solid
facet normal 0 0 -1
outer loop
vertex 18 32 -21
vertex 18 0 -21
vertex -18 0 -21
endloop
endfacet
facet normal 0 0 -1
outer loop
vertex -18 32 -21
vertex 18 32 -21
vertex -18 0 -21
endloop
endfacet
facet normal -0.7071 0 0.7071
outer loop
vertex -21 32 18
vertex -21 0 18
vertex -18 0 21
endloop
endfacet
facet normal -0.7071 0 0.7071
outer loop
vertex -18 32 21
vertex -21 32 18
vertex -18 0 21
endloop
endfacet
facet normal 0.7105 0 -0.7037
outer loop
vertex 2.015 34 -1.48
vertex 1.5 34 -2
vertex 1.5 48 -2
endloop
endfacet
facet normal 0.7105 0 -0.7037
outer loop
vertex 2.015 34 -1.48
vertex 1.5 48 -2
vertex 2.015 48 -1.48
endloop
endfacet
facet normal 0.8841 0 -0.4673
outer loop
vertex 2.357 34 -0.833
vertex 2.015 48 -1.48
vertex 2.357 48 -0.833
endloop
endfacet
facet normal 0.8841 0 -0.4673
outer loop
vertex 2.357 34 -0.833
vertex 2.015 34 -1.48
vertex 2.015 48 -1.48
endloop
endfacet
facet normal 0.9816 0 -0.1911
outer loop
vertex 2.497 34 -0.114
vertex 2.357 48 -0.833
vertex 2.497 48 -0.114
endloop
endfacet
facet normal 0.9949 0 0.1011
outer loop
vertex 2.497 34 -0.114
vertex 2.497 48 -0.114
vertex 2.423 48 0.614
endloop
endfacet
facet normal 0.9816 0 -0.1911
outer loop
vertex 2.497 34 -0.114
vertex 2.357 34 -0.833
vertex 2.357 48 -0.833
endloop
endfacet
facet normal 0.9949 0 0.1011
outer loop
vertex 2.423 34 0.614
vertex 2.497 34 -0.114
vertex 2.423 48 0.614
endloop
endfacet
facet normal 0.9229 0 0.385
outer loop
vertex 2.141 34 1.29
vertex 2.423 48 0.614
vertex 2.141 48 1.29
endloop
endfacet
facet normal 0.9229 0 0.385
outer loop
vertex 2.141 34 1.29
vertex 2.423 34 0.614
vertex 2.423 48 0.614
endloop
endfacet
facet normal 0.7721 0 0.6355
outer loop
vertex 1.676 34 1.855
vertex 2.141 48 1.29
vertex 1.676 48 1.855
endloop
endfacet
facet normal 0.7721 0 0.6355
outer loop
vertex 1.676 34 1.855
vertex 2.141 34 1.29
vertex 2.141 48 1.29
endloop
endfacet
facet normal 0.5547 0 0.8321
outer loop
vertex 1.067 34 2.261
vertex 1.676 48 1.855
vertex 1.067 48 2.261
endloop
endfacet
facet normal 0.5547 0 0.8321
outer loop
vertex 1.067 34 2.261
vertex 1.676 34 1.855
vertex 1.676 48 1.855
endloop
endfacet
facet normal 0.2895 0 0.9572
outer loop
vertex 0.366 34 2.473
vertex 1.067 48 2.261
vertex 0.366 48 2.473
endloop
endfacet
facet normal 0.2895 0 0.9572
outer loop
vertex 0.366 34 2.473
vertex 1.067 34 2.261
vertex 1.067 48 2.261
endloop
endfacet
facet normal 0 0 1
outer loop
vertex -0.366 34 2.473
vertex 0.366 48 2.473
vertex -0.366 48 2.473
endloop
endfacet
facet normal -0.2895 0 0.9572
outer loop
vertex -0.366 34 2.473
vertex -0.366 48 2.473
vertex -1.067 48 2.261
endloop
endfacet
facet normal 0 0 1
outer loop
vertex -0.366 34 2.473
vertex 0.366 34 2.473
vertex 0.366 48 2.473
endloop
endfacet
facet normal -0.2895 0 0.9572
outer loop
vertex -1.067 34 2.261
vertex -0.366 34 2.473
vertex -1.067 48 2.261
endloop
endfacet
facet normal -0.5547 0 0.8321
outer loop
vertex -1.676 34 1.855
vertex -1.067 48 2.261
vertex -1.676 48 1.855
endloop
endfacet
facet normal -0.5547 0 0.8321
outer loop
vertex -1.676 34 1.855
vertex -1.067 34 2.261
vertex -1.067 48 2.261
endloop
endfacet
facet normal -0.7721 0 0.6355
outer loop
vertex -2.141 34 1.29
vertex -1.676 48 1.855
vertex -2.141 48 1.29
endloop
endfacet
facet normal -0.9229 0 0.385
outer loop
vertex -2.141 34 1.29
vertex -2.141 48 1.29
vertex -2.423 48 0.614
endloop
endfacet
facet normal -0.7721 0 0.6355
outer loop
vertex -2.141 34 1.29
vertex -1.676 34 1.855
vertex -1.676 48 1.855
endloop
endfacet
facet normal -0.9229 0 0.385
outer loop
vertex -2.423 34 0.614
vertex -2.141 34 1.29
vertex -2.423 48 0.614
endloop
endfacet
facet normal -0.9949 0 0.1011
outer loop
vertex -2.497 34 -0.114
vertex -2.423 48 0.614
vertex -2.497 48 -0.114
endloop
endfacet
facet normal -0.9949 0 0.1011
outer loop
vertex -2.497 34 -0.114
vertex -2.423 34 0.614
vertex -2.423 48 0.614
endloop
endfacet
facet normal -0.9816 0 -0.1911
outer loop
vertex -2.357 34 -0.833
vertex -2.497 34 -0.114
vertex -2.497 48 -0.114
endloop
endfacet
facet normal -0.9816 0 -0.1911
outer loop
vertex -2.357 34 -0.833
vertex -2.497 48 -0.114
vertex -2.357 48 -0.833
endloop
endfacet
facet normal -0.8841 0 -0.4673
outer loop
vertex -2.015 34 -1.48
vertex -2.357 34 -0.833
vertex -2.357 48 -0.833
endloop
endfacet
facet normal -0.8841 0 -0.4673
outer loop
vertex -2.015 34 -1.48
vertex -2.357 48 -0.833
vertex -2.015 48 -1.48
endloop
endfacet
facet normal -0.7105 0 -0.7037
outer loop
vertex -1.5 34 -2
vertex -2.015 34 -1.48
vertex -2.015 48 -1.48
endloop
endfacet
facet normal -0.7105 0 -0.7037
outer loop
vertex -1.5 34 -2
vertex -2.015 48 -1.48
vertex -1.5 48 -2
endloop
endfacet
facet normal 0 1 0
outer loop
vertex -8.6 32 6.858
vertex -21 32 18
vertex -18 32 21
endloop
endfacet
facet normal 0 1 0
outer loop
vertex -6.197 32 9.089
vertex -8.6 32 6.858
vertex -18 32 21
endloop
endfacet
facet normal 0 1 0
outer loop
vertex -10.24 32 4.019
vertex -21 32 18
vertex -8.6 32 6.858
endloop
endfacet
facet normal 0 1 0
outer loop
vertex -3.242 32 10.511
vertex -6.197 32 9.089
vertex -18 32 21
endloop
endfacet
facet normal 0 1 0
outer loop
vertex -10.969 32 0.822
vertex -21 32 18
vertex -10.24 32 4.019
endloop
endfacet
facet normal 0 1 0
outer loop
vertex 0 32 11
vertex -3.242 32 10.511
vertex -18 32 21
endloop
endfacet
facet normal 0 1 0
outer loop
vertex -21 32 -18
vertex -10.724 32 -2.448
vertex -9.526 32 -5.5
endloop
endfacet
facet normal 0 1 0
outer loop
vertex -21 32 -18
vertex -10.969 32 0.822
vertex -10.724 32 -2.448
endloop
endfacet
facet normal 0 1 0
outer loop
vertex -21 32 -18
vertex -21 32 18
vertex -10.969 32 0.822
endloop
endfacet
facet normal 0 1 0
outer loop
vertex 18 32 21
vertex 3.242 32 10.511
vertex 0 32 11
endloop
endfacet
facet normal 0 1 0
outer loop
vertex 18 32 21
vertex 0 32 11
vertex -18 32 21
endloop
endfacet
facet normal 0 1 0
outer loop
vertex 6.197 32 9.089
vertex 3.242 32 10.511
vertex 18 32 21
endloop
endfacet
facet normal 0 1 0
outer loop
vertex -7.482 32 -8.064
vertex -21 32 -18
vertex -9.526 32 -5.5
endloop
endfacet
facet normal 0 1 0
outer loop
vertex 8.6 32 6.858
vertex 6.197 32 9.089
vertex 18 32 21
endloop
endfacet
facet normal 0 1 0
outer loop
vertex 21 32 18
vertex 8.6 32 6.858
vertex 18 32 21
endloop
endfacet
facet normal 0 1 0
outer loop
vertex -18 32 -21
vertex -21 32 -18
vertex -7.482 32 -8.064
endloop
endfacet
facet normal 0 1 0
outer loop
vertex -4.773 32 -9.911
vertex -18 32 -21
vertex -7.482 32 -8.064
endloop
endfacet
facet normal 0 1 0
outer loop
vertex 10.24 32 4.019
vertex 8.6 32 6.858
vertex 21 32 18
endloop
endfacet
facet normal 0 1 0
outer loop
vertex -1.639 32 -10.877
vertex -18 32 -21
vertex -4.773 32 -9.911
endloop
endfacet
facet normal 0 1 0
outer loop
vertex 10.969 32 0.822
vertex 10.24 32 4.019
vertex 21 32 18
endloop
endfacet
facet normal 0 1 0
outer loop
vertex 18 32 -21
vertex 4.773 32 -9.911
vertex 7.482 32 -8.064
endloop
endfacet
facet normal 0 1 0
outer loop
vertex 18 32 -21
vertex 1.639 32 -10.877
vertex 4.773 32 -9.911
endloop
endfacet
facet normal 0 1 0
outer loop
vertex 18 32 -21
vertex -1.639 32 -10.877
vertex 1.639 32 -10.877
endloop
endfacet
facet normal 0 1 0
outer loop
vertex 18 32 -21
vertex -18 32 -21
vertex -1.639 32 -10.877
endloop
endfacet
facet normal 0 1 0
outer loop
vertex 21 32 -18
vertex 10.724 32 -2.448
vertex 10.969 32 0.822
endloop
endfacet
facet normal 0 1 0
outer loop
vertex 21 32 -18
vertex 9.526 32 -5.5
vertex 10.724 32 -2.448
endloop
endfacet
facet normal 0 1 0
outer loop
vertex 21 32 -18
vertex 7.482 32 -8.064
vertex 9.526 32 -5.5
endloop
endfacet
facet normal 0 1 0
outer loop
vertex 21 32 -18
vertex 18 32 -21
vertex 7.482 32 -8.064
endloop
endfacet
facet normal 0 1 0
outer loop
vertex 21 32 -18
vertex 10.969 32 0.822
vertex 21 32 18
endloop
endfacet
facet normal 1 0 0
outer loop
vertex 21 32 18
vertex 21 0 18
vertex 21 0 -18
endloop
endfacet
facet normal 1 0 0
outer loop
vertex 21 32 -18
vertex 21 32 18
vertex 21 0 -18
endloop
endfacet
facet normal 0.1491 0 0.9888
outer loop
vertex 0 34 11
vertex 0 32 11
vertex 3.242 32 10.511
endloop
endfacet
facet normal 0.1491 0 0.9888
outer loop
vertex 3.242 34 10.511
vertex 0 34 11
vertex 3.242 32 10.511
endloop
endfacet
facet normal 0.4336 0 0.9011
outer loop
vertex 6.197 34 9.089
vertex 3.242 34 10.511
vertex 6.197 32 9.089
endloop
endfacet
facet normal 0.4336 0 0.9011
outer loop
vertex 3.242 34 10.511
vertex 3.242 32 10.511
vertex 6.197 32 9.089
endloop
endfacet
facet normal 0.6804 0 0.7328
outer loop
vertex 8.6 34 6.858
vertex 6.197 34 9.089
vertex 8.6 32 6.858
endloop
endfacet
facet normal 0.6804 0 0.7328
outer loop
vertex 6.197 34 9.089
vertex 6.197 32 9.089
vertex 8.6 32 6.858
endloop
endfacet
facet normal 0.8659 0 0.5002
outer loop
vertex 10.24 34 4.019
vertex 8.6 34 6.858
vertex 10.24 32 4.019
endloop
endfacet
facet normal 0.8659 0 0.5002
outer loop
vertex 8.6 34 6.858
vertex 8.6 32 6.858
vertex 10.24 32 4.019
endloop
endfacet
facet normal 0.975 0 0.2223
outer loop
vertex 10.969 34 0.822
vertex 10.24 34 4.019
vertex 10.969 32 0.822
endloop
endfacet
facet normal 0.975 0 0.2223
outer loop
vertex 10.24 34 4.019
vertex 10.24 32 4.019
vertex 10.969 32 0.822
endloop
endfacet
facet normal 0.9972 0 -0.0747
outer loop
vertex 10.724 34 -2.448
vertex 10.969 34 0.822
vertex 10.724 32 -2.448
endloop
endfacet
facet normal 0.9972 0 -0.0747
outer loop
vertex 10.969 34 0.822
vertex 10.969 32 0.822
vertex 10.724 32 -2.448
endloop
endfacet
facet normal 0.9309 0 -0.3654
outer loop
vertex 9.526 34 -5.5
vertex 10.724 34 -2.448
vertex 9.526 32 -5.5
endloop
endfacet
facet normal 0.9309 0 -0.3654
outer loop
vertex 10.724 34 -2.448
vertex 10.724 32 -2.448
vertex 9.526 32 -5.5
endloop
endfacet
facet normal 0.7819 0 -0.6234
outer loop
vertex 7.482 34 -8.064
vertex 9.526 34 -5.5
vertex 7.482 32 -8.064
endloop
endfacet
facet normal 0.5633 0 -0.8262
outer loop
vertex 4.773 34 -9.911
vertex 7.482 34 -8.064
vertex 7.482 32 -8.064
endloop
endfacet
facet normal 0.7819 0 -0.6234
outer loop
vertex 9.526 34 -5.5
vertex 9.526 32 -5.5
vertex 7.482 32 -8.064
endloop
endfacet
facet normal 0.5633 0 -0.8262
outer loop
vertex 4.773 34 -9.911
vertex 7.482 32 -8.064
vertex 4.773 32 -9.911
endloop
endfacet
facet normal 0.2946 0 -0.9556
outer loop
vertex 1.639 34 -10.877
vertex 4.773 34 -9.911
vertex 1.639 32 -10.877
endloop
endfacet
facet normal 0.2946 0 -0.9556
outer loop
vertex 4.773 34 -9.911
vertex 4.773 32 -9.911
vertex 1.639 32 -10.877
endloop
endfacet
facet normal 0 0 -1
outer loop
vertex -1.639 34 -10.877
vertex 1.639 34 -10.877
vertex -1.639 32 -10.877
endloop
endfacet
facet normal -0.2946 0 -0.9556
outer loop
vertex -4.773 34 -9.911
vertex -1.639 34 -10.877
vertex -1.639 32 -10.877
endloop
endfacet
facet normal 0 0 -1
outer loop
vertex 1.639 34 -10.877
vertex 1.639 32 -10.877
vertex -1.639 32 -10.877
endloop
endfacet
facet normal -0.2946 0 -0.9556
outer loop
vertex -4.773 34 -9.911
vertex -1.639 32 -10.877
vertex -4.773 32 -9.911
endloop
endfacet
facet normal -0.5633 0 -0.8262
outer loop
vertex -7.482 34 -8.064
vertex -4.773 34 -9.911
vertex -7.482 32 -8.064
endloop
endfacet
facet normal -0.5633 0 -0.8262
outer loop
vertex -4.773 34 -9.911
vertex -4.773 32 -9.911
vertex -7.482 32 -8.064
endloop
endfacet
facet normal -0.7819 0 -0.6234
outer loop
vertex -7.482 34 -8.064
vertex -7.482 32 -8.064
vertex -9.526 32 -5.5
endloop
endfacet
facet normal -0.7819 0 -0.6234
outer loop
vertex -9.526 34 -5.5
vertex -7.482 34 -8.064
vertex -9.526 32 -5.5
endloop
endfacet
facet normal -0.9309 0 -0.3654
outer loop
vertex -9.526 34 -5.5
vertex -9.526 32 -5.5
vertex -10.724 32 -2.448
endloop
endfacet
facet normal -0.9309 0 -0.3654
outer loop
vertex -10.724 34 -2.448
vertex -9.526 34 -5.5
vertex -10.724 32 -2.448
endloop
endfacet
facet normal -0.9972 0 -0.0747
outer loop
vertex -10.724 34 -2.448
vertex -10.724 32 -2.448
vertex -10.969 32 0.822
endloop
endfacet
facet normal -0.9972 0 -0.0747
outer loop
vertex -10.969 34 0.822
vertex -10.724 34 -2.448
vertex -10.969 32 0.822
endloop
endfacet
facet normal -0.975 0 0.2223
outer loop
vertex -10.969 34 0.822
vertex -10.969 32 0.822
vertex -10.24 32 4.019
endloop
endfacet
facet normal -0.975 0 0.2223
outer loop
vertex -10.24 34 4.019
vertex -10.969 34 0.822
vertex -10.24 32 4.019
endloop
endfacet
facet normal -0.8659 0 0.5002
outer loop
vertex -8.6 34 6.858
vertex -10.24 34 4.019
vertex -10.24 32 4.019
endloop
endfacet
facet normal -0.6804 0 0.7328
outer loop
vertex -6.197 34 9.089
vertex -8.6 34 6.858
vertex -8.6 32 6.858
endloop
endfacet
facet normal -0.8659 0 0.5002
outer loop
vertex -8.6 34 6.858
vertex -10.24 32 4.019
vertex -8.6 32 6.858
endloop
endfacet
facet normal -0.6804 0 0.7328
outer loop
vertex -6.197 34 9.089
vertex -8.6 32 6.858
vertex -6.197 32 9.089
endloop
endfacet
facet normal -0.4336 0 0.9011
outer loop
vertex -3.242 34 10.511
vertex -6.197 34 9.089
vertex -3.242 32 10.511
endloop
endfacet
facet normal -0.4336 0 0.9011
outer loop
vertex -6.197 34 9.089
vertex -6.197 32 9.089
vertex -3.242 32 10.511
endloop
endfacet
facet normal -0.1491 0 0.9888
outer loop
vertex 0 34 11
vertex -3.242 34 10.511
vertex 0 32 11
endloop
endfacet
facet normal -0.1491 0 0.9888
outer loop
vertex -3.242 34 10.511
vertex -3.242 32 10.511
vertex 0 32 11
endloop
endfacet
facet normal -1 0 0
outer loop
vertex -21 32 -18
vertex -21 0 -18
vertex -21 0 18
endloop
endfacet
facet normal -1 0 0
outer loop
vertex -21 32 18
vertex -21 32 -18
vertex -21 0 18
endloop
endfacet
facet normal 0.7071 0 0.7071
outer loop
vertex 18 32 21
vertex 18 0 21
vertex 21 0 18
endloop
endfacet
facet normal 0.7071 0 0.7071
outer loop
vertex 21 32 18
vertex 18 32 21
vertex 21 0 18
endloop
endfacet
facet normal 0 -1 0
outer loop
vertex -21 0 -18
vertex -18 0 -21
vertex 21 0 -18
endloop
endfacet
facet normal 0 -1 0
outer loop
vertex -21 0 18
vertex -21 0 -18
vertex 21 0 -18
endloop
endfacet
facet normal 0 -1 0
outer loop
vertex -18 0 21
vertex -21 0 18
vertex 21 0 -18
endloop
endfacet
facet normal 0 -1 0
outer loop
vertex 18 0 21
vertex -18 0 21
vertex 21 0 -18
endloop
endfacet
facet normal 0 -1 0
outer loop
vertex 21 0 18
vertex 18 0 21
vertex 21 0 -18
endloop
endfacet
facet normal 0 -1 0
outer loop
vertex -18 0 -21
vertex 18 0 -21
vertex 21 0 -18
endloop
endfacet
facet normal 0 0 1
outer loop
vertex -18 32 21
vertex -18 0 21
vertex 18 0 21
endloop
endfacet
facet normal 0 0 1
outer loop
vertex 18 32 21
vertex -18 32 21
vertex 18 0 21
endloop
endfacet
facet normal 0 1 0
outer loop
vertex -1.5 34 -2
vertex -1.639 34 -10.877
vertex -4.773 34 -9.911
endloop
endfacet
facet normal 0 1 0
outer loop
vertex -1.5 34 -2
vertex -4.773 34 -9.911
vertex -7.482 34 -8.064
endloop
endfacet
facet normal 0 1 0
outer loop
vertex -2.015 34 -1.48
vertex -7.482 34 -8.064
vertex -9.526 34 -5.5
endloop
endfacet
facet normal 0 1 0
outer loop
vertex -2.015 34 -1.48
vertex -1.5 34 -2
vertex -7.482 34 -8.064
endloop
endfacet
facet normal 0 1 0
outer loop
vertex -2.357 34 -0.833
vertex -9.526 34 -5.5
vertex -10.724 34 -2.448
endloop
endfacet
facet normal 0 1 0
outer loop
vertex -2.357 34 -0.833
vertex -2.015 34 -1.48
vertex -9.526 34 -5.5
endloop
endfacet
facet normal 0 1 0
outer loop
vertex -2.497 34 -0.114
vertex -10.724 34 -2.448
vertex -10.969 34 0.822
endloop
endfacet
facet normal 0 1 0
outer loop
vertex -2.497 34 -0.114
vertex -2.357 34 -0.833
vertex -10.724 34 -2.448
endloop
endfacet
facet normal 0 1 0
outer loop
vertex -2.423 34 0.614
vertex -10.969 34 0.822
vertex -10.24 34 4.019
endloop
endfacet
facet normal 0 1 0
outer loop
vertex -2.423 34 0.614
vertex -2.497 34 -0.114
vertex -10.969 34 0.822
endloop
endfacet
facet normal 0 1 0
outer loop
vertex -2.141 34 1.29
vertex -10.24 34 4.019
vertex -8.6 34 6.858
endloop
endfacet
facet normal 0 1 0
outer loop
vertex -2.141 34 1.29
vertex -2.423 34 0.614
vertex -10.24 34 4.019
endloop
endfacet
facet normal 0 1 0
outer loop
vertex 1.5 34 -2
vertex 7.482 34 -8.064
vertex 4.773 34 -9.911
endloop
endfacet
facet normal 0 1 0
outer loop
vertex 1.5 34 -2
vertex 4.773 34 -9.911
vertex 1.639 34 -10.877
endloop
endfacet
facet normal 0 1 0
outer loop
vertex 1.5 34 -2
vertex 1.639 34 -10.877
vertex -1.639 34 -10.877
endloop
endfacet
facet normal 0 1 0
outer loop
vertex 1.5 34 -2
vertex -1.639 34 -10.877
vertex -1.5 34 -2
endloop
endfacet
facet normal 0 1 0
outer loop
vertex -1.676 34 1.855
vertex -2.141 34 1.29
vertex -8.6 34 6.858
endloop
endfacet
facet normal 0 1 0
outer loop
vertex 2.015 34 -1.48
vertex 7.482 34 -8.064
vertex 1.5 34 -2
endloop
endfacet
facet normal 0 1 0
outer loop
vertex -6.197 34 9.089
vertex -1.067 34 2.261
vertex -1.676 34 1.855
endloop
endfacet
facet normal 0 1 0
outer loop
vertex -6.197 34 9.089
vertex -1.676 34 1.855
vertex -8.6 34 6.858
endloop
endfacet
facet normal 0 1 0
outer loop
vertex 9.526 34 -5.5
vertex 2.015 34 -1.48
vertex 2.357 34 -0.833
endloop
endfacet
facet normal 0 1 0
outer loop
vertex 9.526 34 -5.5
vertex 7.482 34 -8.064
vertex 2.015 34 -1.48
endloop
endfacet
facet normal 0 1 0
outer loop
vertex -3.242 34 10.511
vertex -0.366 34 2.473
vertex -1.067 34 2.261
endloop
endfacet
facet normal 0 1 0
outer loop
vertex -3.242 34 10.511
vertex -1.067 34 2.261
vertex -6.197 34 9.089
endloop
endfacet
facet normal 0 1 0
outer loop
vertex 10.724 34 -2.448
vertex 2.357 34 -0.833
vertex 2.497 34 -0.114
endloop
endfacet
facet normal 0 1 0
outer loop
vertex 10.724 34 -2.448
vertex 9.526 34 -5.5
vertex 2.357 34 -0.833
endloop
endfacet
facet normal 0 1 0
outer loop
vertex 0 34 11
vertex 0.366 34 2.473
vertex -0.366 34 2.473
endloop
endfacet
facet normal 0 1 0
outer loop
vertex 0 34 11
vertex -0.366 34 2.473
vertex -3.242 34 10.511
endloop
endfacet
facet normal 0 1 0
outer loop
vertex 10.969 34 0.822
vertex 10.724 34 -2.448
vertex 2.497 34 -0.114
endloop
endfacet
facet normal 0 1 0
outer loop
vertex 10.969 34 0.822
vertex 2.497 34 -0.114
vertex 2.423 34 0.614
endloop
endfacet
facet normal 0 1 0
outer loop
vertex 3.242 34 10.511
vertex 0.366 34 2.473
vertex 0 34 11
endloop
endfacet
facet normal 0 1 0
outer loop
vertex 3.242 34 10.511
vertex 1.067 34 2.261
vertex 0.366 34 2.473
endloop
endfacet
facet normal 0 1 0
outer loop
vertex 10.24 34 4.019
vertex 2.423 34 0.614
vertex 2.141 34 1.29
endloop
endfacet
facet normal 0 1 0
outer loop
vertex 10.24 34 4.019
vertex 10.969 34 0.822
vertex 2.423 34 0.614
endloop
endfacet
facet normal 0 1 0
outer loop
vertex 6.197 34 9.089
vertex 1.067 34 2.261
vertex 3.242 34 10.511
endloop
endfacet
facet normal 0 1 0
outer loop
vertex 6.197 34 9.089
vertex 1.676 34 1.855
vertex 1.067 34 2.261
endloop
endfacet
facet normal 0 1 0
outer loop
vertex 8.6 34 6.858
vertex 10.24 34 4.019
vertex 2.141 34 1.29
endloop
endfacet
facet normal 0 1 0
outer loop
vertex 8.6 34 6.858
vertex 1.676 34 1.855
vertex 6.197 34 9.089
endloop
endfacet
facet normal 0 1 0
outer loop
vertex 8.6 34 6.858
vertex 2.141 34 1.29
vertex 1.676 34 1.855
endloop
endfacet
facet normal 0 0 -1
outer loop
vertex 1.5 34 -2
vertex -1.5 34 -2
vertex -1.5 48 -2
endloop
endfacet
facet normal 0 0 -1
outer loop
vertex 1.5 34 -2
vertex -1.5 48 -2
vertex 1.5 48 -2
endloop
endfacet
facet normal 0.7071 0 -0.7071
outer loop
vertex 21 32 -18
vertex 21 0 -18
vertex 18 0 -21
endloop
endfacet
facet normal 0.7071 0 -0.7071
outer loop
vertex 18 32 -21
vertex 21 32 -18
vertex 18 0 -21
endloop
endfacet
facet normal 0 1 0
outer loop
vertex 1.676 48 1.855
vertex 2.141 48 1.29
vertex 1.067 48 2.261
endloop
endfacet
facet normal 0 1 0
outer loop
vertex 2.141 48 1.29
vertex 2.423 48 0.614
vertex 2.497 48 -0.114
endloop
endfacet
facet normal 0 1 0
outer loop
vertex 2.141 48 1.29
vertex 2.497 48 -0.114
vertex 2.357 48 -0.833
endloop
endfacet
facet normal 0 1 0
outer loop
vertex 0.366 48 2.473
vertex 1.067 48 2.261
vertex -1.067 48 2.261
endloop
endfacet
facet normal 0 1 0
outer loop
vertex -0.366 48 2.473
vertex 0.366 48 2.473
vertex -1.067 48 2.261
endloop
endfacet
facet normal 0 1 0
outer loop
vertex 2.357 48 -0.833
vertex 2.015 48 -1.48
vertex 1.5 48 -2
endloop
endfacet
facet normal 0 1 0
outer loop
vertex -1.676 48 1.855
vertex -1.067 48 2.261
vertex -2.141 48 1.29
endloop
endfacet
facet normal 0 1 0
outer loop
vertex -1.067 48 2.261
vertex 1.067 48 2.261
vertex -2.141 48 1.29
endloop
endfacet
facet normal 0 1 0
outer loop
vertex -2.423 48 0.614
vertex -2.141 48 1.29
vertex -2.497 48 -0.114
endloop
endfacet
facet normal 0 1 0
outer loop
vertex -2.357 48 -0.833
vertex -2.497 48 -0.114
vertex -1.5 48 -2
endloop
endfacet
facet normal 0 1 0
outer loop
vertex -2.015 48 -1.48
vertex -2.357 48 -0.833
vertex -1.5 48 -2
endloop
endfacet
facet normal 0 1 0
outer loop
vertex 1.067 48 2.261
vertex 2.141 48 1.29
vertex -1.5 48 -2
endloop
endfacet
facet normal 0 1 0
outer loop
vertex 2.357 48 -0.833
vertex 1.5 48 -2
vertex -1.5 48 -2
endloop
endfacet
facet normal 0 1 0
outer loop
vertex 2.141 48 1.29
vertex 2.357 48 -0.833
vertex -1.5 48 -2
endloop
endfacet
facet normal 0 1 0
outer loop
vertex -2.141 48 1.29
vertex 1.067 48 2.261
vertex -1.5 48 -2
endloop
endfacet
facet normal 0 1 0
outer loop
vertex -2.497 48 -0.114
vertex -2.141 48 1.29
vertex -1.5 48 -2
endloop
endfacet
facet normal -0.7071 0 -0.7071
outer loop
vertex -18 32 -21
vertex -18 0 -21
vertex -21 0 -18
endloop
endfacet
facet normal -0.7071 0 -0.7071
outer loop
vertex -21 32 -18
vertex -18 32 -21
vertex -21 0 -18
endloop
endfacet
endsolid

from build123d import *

# Parameters (mm, degrees)
BOSS_EXTRUDE1_DEPTH = 32
SKETCH2_R           = 11
BOSS_EXTRUDE2_DEPTH = 2
BOSS_EXTRUDE3_DEPTH = 14


with BuildPart() as part:
    # Sketch1 → Boss-Extrude1 (new body)
    with BuildSketch(Plane(origin=(0, 0, 0), x_dir=(1, 0, 0), z_dir=(0, 1, 0))):
        Polygon((-18, 21), (-21, 18), (-21, -18), (-18, -21), (18, -21), (21, -18), (21, 18), (18, 21), align=None)
    extrude(amount=BOSS_EXTRUDE1_DEPTH)

    # Sketch2 → Boss-Extrude2 (add)
    with BuildSketch(Plane(origin=(0, 32, 0), x_dir=(1, 0, 0), z_dir=(0, 1, 0))):
        with Locations(Location((0, 0, 0), (0, 0, 270))):
            Circle(SKETCH2_R)
    extrude(amount=BOSS_EXTRUDE2_DEPTH)

    # Sketch3 → Boss-Extrude3 (add)
    with BuildSketch(Plane(origin=(0, 34, 0), x_dir=(1, 0, 0), z_dir=(0, 1, 0))):
        with BuildLine():
            Line((-1.5, 2), (1.5, 2))
            ThreePointArc((1.5, 2), (0, -2.5), (-1.5, 2))
        make_face()
    extrude(amount=BOSS_EXTRUDE3_DEPTH)


solid = part.part
